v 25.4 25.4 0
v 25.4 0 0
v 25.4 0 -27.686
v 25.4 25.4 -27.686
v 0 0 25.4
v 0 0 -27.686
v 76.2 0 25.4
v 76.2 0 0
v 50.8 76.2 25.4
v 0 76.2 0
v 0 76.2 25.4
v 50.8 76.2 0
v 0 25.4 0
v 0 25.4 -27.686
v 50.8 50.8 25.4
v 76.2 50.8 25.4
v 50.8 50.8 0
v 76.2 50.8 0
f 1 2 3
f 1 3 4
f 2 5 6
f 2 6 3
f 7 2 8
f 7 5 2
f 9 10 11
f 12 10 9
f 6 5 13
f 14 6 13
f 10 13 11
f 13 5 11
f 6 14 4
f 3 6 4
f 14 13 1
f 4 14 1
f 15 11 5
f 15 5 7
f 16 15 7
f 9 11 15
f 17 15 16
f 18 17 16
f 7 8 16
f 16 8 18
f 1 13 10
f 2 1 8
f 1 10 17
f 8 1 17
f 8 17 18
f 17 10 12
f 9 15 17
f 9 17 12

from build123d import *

# Parameters (mm, degrees)
F0_W     = 76.2
F0_H     = 76.2
F1_DEPTH = 25.4
F2_W     = 25.4
F2_H     = 25.4
F3_DEPTH = 25.4
F4_W     = 25.4
F4_H     = 25.4
F5_DEPTH = 27.686


with BuildPart() as f1:
    # F0 (on Top) → F1 (new body)
    with BuildSketch(Plane.XY):
        with Locations((38.1, 38.1)):
            Rectangle(F0_W, F0_H)
    extrude(amount=F1_DEPTH)

    # F2 (on face) → F3 (cut)
    with BuildSketch(Plane.XY.offset(25.4)):
        with Locations((63.5, 63.5)):
            Rectangle(F2_W, F2_H)
    extrude(amount=-F3_DEPTH, mode=Mode.SUBTRACT)

    # F4 (on Top) → F5 (join)
    with BuildSketch(Plane.XY):
        with Locations((12.7, 12.7)):
            Rectangle(F4_W, F4_H)
    extrude(amount=-F5_DEPTH)


solid = f1.part
